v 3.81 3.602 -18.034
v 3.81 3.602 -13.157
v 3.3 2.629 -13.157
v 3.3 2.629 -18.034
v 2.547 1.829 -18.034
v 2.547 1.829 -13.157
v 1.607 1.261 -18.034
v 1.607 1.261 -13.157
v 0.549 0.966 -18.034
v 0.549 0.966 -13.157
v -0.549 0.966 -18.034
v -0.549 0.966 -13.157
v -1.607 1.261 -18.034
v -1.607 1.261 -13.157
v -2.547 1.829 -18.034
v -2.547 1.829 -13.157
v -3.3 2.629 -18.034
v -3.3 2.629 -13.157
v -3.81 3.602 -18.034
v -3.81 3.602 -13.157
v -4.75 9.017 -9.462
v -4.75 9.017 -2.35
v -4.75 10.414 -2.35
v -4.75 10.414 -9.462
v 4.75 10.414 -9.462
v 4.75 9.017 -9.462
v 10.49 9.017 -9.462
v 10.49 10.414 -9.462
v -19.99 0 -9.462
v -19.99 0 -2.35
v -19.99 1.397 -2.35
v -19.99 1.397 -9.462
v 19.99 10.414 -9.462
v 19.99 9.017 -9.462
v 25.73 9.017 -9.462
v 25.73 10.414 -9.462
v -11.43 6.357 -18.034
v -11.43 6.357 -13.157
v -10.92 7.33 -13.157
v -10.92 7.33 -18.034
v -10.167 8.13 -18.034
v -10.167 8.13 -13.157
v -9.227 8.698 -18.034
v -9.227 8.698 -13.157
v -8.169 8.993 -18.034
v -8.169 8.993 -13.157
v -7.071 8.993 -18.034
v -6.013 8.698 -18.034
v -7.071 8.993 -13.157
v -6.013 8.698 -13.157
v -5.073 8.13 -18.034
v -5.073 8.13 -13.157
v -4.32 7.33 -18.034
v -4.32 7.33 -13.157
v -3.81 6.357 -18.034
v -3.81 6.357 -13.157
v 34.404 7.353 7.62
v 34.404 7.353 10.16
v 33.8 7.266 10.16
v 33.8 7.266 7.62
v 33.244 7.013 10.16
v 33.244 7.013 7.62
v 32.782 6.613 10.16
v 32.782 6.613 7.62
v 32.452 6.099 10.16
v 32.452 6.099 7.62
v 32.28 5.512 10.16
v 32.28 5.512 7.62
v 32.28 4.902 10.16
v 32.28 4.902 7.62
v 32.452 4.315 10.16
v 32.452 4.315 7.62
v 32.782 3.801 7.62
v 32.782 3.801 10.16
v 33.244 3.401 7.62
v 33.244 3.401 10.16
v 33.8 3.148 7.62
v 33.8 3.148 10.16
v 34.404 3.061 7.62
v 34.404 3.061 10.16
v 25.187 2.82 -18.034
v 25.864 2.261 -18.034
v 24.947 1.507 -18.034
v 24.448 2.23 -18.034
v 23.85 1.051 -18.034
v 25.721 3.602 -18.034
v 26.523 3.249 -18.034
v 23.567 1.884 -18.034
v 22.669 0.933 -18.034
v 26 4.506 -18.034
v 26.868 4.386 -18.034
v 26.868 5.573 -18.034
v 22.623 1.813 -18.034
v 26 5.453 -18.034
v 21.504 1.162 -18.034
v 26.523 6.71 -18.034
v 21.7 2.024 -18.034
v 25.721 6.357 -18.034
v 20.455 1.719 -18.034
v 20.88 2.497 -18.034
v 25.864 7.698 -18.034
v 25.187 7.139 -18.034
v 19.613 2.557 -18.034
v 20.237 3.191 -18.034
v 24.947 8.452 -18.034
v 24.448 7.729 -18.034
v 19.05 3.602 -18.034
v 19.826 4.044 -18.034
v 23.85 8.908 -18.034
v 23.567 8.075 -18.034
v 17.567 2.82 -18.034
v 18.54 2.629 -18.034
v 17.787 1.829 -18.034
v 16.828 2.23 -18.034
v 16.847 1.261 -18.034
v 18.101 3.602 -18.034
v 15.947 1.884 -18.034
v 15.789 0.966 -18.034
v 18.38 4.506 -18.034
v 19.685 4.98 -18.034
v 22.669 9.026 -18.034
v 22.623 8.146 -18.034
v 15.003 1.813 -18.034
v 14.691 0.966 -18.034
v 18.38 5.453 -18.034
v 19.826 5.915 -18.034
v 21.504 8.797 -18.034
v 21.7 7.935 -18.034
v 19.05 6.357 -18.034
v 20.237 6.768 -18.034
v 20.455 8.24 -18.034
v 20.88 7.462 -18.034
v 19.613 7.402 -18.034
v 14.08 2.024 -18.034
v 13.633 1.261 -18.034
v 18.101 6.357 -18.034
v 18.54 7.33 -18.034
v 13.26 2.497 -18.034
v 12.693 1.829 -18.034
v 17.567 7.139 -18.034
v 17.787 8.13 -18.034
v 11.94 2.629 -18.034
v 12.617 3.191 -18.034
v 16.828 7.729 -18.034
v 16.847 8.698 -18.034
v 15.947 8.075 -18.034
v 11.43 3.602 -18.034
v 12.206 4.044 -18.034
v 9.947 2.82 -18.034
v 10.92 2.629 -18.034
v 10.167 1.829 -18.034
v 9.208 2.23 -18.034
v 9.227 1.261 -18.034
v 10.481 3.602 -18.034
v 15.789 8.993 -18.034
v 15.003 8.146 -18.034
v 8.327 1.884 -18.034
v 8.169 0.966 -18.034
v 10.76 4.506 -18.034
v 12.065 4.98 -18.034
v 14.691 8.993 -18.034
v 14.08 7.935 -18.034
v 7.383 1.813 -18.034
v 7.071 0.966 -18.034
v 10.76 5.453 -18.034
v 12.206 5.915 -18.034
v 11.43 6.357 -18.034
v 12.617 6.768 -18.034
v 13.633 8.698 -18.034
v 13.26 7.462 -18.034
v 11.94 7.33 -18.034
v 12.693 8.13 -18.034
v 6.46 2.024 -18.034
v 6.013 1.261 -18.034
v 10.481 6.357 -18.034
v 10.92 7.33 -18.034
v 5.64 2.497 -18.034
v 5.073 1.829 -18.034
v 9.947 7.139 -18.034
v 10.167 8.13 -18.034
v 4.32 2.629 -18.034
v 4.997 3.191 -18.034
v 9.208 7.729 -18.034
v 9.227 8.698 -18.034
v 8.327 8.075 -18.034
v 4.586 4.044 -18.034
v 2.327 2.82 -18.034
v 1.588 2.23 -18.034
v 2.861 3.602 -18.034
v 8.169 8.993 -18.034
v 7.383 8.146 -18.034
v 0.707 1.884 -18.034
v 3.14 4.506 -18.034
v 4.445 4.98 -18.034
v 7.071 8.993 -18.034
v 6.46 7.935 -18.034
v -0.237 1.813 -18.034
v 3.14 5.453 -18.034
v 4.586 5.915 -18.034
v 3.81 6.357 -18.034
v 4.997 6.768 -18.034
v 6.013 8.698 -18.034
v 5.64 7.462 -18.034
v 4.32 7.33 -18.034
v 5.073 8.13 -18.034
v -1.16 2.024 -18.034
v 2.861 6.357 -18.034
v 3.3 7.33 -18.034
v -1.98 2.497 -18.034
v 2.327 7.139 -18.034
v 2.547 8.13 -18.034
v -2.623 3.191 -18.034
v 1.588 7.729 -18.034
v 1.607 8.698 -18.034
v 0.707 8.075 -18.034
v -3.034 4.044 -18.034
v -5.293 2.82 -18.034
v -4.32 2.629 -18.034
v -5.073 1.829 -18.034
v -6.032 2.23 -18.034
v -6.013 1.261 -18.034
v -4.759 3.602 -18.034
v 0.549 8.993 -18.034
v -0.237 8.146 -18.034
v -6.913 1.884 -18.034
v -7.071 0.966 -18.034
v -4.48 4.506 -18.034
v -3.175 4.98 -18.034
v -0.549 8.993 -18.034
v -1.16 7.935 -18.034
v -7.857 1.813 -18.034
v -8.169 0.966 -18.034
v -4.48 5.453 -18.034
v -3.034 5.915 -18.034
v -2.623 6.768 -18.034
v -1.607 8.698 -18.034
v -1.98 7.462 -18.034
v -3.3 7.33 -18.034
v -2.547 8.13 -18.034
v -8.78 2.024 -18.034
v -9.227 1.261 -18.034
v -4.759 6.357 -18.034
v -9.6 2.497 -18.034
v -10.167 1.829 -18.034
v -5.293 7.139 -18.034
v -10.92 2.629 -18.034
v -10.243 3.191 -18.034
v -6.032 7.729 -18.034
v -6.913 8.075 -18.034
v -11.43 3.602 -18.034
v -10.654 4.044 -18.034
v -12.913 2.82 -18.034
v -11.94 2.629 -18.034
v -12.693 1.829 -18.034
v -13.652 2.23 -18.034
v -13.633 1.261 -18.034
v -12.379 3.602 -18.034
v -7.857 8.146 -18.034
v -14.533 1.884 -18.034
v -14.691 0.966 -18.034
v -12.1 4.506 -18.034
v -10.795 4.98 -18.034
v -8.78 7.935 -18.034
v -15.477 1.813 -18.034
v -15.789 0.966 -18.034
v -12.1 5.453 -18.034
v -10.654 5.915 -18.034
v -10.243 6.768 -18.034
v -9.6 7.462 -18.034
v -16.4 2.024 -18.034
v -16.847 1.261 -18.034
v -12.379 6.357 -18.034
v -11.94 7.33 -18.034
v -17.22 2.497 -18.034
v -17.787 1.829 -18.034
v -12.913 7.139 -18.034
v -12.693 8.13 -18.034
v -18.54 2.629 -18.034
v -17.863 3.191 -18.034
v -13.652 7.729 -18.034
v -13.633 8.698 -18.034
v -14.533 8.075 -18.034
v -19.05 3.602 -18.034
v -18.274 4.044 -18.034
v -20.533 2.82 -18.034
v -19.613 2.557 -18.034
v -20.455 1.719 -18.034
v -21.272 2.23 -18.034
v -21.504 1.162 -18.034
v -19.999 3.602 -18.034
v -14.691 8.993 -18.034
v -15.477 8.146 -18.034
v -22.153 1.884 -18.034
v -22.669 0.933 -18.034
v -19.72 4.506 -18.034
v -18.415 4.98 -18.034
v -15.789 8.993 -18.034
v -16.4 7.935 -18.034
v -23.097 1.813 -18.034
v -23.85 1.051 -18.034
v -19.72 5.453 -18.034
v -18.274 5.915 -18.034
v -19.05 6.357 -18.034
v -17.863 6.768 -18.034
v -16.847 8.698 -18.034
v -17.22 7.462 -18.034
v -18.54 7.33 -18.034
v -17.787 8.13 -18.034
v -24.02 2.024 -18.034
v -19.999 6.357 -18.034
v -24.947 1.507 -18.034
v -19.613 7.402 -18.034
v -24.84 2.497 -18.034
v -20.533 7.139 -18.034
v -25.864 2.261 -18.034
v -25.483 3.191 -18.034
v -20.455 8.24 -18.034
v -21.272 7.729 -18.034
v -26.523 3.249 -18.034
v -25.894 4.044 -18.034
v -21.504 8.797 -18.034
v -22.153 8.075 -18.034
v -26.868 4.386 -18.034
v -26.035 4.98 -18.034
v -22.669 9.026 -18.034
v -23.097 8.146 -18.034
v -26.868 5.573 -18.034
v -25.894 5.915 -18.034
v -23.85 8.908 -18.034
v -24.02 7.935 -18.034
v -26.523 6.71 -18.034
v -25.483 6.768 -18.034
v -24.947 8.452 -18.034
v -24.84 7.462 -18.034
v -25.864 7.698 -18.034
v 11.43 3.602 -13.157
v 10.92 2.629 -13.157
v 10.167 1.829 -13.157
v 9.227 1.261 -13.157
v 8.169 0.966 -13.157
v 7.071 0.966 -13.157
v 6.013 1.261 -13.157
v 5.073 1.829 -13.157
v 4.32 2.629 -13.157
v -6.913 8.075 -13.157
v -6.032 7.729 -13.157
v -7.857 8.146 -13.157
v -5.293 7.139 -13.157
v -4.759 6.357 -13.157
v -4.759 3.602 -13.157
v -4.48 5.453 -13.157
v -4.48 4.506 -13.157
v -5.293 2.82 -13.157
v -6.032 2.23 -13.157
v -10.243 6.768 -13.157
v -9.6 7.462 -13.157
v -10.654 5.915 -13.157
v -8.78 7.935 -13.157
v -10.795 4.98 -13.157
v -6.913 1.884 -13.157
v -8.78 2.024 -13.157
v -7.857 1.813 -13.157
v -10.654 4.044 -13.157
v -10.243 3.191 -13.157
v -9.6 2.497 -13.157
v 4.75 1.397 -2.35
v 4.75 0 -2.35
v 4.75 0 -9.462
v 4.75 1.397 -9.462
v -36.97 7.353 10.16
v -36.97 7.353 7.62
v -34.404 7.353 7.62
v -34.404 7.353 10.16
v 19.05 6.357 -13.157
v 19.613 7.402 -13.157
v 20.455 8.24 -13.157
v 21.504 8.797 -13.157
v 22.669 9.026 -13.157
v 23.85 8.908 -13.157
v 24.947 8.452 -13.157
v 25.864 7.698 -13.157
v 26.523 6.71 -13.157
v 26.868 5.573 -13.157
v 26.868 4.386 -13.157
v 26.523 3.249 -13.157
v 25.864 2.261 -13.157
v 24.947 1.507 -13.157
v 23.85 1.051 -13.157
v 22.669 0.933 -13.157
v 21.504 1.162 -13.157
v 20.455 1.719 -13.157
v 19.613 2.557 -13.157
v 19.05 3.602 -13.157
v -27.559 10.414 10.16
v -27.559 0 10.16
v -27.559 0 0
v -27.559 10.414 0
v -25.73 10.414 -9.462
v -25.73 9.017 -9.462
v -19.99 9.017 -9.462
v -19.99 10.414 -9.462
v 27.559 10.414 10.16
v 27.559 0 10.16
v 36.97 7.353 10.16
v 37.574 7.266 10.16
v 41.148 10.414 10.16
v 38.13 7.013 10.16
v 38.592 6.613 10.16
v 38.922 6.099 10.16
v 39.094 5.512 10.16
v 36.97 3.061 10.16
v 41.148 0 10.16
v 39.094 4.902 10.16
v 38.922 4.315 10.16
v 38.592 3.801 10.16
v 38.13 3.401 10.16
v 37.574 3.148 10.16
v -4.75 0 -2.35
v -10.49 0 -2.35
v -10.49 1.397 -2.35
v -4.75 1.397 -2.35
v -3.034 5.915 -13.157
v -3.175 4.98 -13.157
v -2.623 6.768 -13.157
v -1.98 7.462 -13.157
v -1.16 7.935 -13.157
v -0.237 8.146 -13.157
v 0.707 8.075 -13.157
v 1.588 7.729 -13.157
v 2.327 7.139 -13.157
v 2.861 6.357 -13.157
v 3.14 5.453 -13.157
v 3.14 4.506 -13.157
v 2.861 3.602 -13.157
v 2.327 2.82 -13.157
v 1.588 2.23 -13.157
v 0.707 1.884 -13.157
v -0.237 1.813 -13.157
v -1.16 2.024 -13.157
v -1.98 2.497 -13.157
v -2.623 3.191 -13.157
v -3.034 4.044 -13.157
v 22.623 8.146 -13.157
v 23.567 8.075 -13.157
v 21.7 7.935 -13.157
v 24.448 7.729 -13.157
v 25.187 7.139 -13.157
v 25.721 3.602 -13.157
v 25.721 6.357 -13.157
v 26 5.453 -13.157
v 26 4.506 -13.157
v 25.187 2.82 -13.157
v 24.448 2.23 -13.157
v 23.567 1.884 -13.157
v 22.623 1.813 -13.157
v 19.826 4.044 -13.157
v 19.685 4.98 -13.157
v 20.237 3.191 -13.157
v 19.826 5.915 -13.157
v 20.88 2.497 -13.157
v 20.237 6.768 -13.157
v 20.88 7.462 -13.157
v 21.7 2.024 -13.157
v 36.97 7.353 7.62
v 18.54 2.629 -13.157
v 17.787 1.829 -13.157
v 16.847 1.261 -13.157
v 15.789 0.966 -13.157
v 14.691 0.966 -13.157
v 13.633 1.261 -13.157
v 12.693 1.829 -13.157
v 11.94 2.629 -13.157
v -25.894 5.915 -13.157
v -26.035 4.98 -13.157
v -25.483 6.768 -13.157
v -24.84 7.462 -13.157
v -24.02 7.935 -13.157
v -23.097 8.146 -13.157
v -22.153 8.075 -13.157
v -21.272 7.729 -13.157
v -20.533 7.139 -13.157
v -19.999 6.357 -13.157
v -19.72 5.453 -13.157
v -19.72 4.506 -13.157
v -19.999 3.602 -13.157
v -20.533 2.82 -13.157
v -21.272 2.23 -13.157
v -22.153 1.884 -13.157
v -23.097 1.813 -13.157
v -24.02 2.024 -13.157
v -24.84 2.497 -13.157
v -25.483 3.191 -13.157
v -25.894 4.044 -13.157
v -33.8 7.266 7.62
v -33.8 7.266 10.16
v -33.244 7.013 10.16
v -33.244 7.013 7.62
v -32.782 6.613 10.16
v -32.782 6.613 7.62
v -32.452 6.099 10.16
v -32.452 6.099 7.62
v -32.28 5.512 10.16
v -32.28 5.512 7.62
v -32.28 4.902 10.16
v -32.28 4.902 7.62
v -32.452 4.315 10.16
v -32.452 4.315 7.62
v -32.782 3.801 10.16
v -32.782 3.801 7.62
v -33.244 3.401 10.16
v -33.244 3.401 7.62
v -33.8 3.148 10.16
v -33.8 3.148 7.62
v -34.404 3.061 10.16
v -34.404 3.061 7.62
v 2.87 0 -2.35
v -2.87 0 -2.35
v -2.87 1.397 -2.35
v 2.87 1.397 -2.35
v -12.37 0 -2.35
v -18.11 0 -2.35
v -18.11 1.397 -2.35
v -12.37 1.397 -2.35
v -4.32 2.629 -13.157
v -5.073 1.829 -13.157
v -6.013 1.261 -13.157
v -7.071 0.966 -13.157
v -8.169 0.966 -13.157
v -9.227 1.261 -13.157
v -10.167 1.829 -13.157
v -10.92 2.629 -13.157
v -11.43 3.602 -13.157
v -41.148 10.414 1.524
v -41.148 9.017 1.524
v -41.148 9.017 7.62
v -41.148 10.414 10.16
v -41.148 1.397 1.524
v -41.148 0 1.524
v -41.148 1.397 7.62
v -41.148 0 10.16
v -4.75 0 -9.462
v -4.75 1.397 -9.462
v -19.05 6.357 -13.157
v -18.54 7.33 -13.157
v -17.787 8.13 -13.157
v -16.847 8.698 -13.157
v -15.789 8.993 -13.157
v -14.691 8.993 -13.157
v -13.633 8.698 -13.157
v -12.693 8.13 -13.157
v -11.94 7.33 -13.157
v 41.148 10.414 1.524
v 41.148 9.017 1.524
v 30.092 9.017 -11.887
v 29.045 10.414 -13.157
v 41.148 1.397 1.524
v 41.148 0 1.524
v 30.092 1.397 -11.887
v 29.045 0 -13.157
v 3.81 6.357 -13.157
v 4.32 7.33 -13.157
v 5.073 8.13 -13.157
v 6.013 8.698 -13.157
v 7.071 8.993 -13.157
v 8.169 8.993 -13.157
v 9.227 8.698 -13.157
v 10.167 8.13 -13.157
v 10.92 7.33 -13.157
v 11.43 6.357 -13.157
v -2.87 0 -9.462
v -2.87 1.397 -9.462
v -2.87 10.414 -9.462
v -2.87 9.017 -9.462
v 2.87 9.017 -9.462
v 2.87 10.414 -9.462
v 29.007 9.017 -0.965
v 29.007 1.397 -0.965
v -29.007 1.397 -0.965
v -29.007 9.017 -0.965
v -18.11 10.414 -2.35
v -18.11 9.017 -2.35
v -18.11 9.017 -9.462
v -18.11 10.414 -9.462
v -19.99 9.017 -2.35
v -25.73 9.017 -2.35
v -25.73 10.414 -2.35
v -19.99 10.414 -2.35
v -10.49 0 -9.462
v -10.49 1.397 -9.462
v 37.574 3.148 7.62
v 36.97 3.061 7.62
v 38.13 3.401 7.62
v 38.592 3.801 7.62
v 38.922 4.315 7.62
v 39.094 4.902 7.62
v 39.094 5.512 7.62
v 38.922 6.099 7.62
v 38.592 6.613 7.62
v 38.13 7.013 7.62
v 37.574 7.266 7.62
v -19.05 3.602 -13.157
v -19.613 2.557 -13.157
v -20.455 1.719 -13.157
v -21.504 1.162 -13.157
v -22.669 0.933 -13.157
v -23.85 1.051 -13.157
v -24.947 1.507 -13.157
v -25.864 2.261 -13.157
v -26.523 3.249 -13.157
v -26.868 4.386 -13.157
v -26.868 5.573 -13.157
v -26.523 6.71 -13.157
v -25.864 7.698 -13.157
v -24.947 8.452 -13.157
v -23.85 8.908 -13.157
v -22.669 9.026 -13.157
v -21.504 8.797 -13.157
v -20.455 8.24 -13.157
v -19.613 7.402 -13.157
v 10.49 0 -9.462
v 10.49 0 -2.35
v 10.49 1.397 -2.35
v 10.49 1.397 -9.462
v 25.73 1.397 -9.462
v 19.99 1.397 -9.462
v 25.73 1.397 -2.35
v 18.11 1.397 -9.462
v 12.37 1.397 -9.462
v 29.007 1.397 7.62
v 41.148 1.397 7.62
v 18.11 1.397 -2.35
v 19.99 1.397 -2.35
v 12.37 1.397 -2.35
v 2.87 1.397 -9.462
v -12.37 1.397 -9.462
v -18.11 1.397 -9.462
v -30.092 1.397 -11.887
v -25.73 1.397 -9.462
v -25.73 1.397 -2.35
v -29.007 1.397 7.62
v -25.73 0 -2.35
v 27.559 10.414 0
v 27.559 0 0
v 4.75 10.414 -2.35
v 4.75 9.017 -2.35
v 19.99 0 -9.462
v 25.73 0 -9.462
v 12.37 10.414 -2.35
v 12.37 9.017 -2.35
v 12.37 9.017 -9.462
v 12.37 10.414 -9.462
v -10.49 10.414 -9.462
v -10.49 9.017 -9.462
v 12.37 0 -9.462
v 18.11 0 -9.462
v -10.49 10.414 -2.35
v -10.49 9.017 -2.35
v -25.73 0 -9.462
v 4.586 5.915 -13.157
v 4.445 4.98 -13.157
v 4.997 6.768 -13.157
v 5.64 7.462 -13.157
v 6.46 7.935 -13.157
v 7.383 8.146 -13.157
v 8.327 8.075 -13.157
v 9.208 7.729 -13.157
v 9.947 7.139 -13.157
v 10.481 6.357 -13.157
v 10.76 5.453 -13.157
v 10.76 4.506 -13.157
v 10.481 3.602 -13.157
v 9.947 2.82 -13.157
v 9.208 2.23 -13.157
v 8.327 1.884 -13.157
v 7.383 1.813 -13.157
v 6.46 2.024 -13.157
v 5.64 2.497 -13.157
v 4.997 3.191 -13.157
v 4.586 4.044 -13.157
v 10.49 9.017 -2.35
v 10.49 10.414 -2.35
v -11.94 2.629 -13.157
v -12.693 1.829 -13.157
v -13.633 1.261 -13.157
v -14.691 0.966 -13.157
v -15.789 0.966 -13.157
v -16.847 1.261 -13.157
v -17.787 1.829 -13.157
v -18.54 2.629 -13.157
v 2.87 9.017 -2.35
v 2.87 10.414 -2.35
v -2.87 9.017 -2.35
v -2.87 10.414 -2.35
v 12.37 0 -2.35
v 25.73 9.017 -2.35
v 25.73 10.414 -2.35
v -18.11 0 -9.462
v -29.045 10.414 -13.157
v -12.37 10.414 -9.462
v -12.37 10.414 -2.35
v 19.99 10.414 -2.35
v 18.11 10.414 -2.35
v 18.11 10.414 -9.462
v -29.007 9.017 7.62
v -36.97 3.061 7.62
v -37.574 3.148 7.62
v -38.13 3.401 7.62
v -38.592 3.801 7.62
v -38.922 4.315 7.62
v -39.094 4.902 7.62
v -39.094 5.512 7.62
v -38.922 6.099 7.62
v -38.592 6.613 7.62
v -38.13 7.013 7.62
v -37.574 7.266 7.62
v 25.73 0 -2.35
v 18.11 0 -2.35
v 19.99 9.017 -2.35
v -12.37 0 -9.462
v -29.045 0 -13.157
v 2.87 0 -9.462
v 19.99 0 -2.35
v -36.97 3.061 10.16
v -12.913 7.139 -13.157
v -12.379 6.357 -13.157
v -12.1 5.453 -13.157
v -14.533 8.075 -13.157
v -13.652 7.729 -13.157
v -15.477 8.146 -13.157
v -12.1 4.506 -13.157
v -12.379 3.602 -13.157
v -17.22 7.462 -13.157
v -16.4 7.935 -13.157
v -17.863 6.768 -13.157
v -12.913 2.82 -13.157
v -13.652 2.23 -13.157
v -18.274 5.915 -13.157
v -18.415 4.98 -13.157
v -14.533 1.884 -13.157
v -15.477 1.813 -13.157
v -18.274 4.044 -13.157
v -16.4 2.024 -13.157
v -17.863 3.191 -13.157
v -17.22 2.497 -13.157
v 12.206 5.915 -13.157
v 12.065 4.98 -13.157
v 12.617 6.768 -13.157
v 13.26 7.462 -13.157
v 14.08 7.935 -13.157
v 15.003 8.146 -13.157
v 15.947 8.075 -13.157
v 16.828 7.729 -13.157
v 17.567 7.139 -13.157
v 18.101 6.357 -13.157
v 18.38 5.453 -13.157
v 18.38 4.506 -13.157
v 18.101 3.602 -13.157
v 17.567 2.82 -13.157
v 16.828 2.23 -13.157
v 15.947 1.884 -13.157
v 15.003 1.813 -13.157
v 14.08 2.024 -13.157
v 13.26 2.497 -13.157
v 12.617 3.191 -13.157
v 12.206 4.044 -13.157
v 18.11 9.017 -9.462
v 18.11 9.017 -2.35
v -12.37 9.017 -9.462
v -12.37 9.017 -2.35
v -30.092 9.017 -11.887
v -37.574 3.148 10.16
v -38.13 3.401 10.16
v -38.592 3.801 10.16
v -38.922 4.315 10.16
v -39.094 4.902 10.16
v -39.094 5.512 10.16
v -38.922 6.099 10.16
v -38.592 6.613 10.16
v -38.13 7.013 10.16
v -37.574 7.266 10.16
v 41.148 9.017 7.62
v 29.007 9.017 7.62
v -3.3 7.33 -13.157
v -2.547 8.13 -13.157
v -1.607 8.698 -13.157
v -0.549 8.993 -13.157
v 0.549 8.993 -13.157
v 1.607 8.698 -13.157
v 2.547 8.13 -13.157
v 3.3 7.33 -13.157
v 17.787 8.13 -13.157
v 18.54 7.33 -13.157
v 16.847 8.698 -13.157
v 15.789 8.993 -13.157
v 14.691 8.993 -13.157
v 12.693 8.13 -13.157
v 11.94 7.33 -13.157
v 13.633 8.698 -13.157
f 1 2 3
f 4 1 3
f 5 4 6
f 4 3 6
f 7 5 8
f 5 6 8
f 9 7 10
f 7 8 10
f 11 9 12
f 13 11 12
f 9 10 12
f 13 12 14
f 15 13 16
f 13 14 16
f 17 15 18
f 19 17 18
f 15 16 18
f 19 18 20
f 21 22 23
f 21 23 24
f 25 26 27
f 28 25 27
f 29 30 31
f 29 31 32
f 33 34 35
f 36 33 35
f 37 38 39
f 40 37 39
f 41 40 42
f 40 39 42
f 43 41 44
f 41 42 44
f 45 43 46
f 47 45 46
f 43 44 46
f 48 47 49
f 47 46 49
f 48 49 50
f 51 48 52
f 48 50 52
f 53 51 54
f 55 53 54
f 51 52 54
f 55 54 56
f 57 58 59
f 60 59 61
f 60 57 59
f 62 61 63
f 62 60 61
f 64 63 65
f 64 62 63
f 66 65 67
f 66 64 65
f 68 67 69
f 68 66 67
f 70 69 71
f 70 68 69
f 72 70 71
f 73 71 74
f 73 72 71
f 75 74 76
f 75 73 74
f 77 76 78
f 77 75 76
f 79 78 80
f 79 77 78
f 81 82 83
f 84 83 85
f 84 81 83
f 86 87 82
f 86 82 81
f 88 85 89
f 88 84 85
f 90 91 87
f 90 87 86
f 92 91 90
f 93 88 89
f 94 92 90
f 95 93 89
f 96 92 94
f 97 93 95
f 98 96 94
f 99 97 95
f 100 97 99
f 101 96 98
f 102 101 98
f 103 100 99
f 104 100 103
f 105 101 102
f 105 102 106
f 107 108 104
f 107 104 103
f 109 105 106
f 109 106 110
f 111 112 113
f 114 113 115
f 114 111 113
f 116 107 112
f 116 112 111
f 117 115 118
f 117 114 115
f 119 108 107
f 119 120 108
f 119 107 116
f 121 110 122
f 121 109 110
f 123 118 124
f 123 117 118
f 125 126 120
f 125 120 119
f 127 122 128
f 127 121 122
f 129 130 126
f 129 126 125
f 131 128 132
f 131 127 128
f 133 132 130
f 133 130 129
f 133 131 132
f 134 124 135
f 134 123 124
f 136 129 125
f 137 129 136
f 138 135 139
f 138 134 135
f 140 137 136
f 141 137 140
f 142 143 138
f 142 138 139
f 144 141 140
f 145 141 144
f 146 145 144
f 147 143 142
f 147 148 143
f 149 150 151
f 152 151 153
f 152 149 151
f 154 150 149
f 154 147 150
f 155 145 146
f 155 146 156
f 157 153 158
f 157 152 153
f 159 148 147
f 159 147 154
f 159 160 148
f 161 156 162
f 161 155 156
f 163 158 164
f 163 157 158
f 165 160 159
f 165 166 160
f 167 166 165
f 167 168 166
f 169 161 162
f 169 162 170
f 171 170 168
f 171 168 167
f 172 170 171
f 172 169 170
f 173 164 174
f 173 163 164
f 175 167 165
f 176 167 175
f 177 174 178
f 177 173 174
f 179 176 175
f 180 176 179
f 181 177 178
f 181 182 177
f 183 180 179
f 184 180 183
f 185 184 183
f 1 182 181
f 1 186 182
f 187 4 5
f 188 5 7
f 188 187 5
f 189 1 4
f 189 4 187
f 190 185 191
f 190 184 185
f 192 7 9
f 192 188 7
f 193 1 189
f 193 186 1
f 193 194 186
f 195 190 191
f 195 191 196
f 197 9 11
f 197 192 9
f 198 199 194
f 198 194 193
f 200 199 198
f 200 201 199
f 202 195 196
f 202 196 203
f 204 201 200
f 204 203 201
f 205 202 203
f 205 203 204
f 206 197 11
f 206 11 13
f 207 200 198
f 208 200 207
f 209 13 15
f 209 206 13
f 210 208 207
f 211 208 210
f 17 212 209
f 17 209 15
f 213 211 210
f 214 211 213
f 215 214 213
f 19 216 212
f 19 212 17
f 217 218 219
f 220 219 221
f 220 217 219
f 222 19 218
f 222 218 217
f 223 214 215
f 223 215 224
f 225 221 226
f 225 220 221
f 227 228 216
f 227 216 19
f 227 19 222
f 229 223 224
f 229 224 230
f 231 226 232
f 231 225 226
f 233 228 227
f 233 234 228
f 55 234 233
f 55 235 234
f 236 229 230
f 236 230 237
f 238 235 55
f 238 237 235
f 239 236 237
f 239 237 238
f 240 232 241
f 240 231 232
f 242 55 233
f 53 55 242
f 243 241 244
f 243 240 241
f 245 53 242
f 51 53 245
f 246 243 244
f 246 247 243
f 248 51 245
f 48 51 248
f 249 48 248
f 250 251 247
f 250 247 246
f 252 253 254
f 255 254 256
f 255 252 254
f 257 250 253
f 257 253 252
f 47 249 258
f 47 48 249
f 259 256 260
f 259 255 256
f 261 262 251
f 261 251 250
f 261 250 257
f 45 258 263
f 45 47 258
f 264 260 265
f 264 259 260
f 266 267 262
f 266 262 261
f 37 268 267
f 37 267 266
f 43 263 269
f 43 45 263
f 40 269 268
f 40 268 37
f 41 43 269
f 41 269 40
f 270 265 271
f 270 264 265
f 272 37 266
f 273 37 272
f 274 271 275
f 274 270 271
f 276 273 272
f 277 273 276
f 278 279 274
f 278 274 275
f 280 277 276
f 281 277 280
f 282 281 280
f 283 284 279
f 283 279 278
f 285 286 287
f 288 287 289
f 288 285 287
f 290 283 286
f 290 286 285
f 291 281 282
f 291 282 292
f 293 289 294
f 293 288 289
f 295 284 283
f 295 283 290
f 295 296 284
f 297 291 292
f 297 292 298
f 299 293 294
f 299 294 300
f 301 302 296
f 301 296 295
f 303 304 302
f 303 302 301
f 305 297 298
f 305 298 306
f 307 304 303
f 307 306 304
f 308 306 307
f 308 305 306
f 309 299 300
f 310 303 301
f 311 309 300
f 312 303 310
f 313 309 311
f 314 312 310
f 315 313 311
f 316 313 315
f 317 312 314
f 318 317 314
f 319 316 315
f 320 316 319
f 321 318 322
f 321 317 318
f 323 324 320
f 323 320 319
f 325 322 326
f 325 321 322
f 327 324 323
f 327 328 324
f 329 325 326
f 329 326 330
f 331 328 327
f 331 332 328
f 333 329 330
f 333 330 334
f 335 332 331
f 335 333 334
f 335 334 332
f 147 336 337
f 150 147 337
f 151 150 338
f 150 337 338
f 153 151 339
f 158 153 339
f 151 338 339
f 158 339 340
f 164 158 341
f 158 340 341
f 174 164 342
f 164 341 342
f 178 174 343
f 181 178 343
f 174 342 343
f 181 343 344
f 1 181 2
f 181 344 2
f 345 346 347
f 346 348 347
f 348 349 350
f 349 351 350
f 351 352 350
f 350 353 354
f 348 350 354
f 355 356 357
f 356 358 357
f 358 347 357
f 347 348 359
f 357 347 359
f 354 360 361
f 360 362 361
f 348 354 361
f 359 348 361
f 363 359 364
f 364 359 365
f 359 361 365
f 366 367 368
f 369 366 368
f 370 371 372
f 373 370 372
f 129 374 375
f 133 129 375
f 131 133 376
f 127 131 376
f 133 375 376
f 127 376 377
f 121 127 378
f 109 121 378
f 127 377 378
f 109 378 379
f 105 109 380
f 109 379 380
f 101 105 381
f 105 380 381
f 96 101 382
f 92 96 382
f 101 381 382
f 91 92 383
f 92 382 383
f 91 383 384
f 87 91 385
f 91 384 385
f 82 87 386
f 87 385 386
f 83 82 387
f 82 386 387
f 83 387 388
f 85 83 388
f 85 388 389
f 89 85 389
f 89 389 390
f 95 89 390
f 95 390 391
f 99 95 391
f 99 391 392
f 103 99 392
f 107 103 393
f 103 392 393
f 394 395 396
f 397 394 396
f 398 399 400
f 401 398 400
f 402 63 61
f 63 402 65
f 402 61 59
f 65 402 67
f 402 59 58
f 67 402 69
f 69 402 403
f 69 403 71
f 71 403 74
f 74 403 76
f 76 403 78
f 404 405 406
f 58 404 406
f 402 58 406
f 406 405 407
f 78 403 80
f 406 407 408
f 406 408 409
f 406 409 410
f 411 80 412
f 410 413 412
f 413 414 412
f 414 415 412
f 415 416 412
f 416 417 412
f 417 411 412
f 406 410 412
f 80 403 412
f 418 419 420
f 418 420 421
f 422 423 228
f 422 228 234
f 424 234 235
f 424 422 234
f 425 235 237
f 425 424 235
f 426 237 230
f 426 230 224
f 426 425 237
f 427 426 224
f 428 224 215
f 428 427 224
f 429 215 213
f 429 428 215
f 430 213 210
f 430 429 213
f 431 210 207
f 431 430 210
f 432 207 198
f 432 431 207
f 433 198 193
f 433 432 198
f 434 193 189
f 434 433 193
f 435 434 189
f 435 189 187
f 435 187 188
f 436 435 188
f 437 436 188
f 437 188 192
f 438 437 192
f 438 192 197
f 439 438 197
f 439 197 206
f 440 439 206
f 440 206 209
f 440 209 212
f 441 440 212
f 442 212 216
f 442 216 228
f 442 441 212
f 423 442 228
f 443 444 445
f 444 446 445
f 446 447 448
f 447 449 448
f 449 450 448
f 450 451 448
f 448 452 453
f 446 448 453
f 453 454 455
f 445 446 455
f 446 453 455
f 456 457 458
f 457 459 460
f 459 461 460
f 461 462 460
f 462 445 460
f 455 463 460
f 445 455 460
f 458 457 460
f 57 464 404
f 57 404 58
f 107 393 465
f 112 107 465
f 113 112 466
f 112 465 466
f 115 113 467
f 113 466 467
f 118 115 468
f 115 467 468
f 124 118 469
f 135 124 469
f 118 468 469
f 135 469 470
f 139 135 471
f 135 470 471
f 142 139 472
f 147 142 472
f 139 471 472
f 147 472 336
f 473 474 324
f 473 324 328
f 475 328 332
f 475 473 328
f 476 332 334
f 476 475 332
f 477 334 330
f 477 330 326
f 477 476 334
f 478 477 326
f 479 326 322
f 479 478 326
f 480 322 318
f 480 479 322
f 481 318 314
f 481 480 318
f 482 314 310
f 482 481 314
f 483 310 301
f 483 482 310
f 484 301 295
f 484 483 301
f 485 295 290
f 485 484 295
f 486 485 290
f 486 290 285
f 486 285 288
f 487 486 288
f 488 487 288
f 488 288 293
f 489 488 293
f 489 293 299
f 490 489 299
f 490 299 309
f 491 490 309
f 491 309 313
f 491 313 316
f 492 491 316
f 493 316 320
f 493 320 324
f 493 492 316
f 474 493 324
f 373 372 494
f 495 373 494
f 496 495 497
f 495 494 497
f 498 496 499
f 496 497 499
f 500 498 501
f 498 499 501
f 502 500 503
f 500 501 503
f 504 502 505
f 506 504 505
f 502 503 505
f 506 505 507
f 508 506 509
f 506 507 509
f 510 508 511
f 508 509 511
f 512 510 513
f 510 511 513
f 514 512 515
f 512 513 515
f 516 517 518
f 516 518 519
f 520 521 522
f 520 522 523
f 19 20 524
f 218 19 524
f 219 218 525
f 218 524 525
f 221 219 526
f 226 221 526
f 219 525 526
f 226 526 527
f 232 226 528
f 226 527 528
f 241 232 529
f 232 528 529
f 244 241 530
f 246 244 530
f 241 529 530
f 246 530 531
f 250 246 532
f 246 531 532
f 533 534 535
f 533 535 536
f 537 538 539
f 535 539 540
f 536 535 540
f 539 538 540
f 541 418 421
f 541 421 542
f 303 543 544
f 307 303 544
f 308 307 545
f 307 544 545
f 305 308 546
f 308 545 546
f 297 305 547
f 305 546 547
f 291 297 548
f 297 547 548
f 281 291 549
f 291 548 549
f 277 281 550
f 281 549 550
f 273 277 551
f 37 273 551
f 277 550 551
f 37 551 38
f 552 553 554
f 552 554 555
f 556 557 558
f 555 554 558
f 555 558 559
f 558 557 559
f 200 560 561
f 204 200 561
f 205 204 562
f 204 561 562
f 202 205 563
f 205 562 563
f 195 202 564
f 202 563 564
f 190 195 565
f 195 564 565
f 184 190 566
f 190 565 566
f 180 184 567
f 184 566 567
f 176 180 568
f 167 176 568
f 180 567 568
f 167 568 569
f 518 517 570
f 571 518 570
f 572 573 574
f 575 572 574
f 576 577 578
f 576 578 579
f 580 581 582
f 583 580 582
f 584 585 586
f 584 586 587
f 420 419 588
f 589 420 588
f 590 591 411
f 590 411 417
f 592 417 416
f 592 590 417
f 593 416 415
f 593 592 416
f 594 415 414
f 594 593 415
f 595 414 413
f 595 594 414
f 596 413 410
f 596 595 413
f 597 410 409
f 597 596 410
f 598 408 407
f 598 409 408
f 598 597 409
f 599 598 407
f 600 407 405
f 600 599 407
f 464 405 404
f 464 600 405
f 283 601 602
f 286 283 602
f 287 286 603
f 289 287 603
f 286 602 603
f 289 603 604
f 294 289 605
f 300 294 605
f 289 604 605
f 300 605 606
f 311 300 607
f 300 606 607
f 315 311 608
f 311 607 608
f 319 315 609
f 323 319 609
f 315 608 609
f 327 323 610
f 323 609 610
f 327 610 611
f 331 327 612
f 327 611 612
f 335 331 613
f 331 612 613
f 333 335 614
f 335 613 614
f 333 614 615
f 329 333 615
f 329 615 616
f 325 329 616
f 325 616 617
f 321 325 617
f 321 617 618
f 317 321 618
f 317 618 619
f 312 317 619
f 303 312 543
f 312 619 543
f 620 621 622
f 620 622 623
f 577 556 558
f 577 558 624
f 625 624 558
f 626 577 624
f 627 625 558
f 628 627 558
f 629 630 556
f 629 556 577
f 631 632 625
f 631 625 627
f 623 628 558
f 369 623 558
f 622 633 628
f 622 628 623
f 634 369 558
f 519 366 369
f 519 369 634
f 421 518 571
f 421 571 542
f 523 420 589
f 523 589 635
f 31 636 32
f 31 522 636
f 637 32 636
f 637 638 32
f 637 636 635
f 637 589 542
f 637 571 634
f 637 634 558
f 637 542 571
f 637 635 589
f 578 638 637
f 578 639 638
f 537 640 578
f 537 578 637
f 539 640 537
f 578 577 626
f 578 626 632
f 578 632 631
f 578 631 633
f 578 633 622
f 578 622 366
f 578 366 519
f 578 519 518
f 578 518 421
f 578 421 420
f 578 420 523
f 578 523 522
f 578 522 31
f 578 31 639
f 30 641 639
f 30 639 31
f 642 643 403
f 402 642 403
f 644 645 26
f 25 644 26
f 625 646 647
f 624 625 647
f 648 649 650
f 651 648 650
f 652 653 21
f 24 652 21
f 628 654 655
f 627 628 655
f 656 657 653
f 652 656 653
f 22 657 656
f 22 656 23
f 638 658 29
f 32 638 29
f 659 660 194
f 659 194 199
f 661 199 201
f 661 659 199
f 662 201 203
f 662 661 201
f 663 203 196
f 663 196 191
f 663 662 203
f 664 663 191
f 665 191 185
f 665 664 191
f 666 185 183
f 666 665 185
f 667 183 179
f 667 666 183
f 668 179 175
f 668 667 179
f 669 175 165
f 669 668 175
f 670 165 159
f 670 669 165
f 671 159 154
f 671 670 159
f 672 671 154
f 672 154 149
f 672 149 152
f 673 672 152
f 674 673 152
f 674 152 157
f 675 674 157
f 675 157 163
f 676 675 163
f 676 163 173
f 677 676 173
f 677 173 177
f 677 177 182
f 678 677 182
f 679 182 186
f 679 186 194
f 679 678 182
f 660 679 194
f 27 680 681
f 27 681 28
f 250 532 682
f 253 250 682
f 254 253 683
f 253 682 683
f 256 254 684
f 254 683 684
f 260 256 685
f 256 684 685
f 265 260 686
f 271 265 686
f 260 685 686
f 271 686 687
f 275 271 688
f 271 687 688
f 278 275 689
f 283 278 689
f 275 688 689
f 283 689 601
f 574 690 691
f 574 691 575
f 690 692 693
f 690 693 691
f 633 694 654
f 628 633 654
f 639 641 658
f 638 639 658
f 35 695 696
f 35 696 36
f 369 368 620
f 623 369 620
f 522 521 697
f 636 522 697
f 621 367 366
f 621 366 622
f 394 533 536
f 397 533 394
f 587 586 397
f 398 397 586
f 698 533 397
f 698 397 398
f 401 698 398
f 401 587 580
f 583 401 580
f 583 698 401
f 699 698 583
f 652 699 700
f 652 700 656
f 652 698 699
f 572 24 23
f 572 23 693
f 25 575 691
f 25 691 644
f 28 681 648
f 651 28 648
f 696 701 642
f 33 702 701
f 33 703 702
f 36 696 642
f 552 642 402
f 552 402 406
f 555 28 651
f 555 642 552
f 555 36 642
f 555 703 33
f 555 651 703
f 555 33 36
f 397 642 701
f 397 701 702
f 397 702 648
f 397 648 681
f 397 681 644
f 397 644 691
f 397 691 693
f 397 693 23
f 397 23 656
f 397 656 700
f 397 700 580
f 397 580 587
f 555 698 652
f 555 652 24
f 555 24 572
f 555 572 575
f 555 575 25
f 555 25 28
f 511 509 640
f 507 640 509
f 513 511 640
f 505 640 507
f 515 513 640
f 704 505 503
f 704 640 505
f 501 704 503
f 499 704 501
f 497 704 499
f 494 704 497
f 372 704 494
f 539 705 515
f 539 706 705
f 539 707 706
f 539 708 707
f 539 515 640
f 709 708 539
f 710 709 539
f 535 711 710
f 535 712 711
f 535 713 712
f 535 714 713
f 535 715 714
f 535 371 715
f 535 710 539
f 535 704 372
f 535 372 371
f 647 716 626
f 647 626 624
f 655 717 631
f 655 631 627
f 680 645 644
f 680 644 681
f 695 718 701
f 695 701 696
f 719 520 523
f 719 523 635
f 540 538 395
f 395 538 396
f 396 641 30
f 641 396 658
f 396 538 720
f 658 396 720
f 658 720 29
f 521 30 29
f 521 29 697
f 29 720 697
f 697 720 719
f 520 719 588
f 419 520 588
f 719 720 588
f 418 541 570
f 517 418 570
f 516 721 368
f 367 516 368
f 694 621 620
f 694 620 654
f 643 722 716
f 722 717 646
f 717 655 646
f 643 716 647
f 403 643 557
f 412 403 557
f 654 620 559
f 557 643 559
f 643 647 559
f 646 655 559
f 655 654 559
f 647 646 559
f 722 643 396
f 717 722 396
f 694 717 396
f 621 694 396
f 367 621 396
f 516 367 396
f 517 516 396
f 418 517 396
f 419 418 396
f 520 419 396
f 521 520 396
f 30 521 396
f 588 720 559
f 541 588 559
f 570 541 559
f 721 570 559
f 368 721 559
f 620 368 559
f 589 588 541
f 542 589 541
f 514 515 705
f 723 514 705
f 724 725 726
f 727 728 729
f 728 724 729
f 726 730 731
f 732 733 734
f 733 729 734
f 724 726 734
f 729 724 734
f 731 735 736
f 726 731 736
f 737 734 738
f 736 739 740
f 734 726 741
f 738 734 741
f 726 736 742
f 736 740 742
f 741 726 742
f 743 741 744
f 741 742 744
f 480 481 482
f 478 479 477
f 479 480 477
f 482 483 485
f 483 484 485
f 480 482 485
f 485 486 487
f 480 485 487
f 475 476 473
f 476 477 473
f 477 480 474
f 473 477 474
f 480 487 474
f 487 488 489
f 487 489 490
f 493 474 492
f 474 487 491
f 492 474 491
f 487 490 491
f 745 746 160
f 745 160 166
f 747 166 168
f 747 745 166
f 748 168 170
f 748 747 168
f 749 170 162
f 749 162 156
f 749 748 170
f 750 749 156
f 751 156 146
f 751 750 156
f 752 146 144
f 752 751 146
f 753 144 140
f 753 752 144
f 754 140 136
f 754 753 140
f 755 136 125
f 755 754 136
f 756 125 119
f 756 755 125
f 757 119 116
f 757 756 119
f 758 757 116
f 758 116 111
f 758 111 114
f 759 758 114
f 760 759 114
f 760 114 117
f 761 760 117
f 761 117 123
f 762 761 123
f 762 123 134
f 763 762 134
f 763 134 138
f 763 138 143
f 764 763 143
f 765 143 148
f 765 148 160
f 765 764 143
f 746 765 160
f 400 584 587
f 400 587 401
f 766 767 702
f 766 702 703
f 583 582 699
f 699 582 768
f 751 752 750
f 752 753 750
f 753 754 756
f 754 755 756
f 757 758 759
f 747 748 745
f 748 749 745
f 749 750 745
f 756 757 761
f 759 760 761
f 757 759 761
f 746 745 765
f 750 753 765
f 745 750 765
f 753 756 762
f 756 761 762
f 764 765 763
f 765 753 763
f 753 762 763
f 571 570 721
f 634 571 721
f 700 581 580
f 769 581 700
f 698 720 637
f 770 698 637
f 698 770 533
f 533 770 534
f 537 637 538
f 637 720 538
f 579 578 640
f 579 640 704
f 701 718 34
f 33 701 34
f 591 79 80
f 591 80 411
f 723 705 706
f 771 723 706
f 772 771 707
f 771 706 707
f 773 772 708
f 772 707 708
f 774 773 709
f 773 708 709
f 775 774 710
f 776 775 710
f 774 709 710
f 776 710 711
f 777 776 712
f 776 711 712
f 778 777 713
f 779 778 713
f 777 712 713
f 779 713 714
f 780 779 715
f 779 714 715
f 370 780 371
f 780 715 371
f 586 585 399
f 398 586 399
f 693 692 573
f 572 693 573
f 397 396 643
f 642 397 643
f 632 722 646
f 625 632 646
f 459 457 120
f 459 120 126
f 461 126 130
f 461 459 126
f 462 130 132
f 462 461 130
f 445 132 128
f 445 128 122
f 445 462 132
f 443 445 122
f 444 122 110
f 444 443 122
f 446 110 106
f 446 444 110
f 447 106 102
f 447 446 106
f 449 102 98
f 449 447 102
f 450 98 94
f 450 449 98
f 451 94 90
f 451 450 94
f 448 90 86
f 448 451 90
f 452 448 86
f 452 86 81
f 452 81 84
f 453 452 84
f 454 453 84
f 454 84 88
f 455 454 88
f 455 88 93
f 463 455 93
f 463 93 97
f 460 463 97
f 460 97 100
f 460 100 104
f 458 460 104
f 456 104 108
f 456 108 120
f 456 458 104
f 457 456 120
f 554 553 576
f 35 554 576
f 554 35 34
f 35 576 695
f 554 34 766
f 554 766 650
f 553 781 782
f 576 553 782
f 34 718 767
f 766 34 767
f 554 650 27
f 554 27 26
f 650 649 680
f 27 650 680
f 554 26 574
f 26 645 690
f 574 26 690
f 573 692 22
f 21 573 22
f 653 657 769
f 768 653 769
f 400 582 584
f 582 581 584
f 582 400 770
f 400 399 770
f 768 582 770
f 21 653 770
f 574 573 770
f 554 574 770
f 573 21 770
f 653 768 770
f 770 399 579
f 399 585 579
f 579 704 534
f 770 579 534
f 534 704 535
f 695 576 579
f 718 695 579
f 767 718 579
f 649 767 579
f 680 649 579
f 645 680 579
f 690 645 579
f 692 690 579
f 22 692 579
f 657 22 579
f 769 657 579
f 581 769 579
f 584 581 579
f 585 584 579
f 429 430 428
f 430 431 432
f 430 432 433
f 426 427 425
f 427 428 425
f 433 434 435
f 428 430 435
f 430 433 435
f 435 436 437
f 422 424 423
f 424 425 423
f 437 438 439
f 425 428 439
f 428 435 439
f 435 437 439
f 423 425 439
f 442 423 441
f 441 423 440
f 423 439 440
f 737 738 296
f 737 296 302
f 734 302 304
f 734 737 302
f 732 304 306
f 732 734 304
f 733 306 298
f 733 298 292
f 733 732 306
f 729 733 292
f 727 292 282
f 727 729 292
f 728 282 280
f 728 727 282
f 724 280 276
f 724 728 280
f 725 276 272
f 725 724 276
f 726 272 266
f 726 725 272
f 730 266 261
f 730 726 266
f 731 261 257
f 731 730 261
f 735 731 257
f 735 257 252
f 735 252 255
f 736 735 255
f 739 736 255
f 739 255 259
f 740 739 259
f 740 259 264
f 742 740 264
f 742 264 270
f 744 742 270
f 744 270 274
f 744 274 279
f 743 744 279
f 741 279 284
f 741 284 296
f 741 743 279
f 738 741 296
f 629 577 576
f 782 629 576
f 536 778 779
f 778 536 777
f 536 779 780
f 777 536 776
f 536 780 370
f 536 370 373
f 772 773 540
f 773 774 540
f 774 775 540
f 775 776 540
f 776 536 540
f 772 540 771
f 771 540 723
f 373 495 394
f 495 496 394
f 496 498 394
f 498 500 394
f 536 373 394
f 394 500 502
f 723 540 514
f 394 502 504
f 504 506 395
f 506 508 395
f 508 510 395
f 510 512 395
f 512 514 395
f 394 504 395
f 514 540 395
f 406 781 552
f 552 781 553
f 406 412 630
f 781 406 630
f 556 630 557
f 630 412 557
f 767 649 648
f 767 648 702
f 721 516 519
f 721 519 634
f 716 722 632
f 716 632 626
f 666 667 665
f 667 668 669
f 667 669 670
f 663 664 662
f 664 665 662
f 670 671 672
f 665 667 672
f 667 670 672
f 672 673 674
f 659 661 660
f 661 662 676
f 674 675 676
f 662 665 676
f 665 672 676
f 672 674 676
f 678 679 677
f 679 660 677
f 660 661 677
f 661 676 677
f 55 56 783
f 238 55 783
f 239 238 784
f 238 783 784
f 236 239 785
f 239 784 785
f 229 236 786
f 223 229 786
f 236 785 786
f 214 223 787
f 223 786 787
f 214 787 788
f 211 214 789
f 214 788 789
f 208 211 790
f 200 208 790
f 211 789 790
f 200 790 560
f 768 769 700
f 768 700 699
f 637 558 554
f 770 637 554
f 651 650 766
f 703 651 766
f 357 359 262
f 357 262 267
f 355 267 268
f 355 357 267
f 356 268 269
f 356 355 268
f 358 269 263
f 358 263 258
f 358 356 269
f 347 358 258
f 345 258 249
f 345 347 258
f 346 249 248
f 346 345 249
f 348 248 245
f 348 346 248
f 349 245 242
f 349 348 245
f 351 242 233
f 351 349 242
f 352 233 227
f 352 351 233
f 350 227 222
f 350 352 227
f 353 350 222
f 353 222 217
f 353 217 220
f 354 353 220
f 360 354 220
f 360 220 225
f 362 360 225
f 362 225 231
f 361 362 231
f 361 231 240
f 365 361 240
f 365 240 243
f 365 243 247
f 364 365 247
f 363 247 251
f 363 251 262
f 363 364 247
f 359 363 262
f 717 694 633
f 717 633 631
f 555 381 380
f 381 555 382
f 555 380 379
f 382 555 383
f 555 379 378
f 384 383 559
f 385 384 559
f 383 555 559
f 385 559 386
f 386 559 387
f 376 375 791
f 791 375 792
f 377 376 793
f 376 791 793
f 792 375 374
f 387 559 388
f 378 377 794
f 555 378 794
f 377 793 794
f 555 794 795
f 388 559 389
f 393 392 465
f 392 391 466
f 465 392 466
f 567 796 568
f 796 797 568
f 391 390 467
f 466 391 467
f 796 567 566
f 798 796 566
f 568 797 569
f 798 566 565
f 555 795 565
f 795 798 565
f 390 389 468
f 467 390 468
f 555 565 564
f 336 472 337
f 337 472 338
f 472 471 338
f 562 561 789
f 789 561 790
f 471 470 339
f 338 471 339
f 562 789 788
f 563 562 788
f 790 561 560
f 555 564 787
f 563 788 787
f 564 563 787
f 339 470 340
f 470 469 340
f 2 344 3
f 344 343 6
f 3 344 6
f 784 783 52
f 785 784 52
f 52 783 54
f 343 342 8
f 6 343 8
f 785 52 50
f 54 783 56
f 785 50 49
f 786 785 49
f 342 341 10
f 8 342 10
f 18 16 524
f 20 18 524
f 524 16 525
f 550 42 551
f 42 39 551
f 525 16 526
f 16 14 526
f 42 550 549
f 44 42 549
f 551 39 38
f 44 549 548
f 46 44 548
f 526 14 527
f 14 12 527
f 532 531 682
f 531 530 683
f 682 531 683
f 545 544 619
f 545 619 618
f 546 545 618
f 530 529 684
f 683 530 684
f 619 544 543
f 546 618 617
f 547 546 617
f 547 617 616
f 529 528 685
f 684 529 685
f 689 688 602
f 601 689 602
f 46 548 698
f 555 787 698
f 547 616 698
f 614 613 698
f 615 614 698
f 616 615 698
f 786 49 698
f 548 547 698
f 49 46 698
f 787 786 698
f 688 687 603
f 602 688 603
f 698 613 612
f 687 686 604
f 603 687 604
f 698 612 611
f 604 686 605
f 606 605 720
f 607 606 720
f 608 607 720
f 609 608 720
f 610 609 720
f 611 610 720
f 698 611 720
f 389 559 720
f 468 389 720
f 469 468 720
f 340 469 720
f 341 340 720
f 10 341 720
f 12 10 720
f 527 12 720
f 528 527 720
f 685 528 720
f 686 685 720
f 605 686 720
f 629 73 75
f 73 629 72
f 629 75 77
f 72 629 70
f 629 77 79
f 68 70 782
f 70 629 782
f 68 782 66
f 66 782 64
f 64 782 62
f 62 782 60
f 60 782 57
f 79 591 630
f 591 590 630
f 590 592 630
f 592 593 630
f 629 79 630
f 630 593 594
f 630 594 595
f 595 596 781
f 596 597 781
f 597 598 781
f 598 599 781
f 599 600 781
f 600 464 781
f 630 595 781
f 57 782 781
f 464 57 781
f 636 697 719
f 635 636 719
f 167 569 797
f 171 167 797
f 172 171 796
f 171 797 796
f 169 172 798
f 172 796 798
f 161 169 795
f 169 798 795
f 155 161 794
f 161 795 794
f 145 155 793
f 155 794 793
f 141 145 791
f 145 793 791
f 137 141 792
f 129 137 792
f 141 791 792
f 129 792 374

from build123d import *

# Parameters (mm, degrees)
SKETCH1_W           = 5.7404
SKETCH1_H           = 7.112
BOSS_EXTRUDE1_DEPTH = 10.414
CUT_EXTRUDE1_START  = -2.54
SKETCH3_W           = 12.1412
SKETCH3_H           = 7.62
CUT_EXTRUDE1_DEPTH  = 19.5072
SKETCH4_W           = 10.922
SKETCH4_H           = 7.62
CUT_EXTRUDE2_DEPTH  = 73.133620947
CUT_EXTRUDE3_DEPTH  = 48.257817764
SKETCH6_R           = 3.175
BOSS_EXTRUDE2_DEPTH = 4.8768


with BuildPart() as part:
    # Sketch1 → Boss-Extrude1 (new body)
    with BuildSketch(Plane(origin=(0, 0, 0), x_dir=(1, 0, 0), z_dir=(0, 1, 0))):
        Polygon((-41.148, -10.16), (-27.559, -10.16), (-27.559, 0), (27.559, 0), (27.559, -10.16), (41.148, -10.16), (41.148, -1.524), (29.0449, 13.1572), (-29.0449, 13.1572), (-41.148, -1.524), align=None)
        with Locations((7.62, 5.9055)):
            Rectangle(SKETCH1_W, SKETCH1_H, mode=Mode.SUBTRACT)
        with Locations((0, 5.9055)):
            Rectangle(SKETCH1_W, SKETCH1_H, mode=Mode.SUBTRACT)
        with Locations((15.24, 5.9055)):
            Rectangle(SKETCH1_W, SKETCH1_H, mode=Mode.SUBTRACT)
        with Locations((22.86, 5.9055)):
            Rectangle(SKETCH1_W, SKETCH1_H, mode=Mode.SUBTRACT)
        with Locations((-7.62, 5.9055)):
            Rectangle(SKETCH1_W, SKETCH1_H, mode=Mode.SUBTRACT)
        with Locations((-15.24, 5.9055)):
            Rectangle(SKETCH1_W, SKETCH1_H, mode=Mode.SUBTRACT)
        with Locations((-22.86, 5.9055)):
            Rectangle(SKETCH1_W, SKETCH1_H, mode=Mode.SUBTRACT)
    extrude(amount=BOSS_EXTRUDE1_DEPTH)

    # Sketch3 → Cut-Extrude1 (cut)
    with BuildSketch(Plane.XY.offset(10.16).offset(CUT_EXTRUDE1_START)):
        with Locations((35.0774, 5.207)):
            Rectangle(SKETCH3_W, SKETCH3_H)
    cut_extrude1 = extrude(amount=-CUT_EXTRUDE1_DEPTH, mode=Mode.SUBTRACT)

    # Sketch4 → Cut-Extrude2 (cut, through all)
    with BuildSketch(Plane(origin=(29.0068, 0, 0), x_dir=(0, 0, -1), z_dir=(1, 0, 0))):
        with Locations((6.4262, 5.207)):
            Rectangle(SKETCH4_W, SKETCH4_H)
    extrude(amount=-CUT_EXTRUDE2_DEPTH, mode=Mode.SUBTRACT)

    # Sketch5 → Cut-Extrude3 (cut, through all)
    with BuildSketch(Plane(origin=(0, 0, 7.62), x_dir=(-1, 0, 0), z_dir=(0, 0, -1))):
        with BuildLine():
            Line((-34.4043, 3.0607), (-36.9697, 3.0607))
            ThreePointArc((-36.9697, 3.0607), (-39.116, 5.207), (-36.9697, 7.3533))
            Line((-36.9697, 7.3533), (-34.4043, 7.3533))
            ThreePointArc((-34.4043, 7.3533), (-32.258, 5.207), (-34.4043, 3.0607))
        make_face()
    cut_extrude3 = extrude(amount=-CUT_EXTRUDE3_DEPTH, mode=Mode.SUBTRACT)

    # Mirror1: Cut-Extrude1, Cut-Extrude3 across plane
    add(cut_extrude1.mirror(Plane(origin=(0, 0, 0), x_dir=(0, 0, 1), z_dir=(1, 0, 0))), mode=Mode.SUBTRACT)
    add(cut_extrude3.mirror(Plane(origin=(0, 0, 0), x_dir=(0, 0, 1), z_dir=(1, 0, 0))), mode=Mode.SUBTRACT)

    # Sketch6 → Boss-Extrude2 (add)
    with BuildSketch(Plane(origin=(0, 0, -13.1572), x_dir=(-1, 0, 0), z_dir=(0, 0, -1))):
        with BuildLine():
            ThreePointArc((-3.81, 3.602218207), (0, 0.92820964), (3.81, 3.602218207))
            ThreePointArc((3.81, 3.602218207), (7.62, 0.92820964), (11.43, 3.602218207))
            ThreePointArc((11.43, 3.602218207), (15.24, 0.92820964), (19.05, 3.602218207))
            ThreePointArc((19.05, 3.602218207), (26.9113, 4.97950964), (19.05, 6.356801072))
            ThreePointArc((19.05, 6.356801072), (15.24, 9.03080964), (11.43, 6.356801072))
            ThreePointArc((11.43, 6.356801072), (7.62, 9.03080964), (3.81, 6.356801072))
            ThreePointArc((3.81, 6.356801072), (0, 9.03080964), (-3.81, 6.356801072))
            ThreePointArc((-3.81, 6.356801072), (-7.62, 9.03080964), (-11.43, 6.356801072))
            ThreePointArc((-11.43, 6.356801072), (-15.24, 9.03080964), (-19.05, 6.356801072))
            ThreePointArc((-19.05, 6.356801072), (-26.9113, 4.97950964), (-19.05, 3.602218207))
            ThreePointArc((-19.05, 3.602218207), (-15.24, 0.92820964), (-11.43, 3.602218207))
            ThreePointArc((-11.43, 3.602218207), (-7.62, 0.92820964), (-3.81, 3.602218207))
        make_face()
        with Locations((0, 4.97950964)):
            Circle(SKETCH6_R, mode=Mode.SUBTRACT)
        with Locations((7.62, 4.97950964)):
            Circle(SKETCH6_R, mode=Mode.SUBTRACT)
        with Locations((15.24, 4.97950964)):
            Circle(SKETCH6_R, mode=Mode.SUBTRACT)
        with Locations((22.86, 4.97950964)):
            Circle(SKETCH6_R, mode=Mode.SUBTRACT)
        with Locations((-7.62, 4.97950964)):
            Circle(SKETCH6_R, mode=Mode.SUBTRACT)
        with Locations((-15.24, 4.97950964)):
            Circle(SKETCH6_R, mode=Mode.SUBTRACT)
        with Locations((-22.86, 4.97950964)):
            Circle(SKETCH6_R, mode=Mode.SUBTRACT)
    extrude(amount=BOSS_EXTRUDE2_DEPTH)


solid = part.part
